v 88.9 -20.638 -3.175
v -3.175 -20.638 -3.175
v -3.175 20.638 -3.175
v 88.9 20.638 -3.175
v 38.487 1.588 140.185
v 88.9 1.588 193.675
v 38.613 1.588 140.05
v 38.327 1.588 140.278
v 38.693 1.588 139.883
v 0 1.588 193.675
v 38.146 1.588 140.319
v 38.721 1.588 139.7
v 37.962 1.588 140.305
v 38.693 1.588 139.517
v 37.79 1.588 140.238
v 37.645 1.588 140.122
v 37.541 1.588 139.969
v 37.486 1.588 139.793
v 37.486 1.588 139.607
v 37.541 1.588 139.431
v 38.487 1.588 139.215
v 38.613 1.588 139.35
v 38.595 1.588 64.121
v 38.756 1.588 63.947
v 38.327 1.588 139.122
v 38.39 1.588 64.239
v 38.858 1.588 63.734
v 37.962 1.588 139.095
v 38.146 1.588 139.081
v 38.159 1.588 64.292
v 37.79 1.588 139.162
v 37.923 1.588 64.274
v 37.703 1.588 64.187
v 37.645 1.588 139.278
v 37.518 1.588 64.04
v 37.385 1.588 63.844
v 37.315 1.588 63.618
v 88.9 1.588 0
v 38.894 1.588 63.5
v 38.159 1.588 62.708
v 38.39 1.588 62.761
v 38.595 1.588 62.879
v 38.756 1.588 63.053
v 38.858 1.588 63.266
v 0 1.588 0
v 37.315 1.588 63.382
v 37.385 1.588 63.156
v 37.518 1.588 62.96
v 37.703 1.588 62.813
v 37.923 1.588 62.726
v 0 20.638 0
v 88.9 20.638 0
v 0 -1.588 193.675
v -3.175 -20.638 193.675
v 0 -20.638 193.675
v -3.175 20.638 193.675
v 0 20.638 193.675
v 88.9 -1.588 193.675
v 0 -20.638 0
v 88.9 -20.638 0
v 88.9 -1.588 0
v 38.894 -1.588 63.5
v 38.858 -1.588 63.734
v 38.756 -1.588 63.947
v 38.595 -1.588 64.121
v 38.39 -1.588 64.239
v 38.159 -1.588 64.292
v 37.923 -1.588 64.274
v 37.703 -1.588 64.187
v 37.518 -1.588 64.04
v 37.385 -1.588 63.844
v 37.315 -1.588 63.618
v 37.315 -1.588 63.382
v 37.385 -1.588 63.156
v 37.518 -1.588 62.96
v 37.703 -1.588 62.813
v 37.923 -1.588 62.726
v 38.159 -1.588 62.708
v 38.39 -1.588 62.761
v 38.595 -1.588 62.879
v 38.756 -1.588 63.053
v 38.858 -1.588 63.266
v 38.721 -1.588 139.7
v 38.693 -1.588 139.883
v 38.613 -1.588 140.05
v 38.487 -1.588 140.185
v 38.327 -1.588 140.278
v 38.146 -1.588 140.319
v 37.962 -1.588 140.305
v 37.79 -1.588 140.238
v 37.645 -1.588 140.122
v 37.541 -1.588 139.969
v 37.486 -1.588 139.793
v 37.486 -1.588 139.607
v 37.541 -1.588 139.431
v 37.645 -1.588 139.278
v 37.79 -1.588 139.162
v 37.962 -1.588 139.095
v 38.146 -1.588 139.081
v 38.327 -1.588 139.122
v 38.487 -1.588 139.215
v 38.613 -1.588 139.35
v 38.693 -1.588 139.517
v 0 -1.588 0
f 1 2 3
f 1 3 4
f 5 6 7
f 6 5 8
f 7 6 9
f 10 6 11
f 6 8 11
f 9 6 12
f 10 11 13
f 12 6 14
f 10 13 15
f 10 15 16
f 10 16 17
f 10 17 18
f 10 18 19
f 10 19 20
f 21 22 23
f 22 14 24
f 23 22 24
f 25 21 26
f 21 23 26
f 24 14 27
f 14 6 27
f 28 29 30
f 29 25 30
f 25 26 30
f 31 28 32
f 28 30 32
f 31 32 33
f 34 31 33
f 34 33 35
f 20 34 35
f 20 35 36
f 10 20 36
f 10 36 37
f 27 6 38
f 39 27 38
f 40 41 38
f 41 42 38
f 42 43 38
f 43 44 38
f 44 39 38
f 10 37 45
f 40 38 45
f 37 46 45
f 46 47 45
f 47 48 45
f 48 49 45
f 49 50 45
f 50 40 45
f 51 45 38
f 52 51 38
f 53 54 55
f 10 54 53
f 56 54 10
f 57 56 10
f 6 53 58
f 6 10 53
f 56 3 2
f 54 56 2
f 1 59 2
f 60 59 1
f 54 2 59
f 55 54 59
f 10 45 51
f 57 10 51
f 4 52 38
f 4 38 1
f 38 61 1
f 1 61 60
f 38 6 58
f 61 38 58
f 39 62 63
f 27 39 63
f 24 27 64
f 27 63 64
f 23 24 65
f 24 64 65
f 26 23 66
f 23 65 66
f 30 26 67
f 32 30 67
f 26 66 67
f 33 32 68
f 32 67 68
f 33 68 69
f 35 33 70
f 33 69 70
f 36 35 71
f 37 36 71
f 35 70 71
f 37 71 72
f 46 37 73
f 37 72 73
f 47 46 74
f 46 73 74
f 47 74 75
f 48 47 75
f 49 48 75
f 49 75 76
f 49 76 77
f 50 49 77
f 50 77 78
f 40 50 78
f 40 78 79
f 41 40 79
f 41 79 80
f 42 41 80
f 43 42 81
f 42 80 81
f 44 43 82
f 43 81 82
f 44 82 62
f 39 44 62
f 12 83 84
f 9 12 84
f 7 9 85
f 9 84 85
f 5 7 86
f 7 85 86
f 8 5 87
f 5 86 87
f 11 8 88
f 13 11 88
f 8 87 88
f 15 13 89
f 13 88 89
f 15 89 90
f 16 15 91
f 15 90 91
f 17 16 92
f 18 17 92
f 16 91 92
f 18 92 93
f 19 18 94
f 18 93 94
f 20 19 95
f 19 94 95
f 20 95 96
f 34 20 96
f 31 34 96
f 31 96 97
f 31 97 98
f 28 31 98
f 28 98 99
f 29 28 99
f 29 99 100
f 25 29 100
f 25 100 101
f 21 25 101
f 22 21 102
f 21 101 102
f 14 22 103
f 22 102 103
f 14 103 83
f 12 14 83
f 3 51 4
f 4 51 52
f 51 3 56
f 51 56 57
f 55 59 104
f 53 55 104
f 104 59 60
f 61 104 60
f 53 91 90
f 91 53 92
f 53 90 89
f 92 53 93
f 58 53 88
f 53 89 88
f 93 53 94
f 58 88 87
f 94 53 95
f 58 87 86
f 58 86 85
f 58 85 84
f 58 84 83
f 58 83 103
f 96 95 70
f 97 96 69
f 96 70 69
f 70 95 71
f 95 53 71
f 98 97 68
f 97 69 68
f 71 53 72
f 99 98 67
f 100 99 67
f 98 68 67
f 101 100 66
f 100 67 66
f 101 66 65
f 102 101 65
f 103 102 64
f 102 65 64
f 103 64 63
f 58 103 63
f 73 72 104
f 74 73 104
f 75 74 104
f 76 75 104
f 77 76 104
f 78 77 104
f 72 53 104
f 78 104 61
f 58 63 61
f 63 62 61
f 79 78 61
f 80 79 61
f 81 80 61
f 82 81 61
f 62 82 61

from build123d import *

# Parameters (mm, degrees)
F1_DEPTH = 193.675
F2_W     = 92.075
F2_H     = 41.275
F3_DEPTH = 3.175
F4_R     = 0.79375
F4_R_2   = 0.620834
F5_DEPTH = 3.175


with BuildPart() as f1:
    # F0 (on Top) → F1 (new body)
    with BuildSketch(Plane.XY):
        Polygon((0, 1.5875), (0, 20.6375), (-3.175, 20.6375), (-3.175, -20.6375), (0, -20.6375), (0, -1.5875), (88.9, -1.5875), (88.9, 1.5875), align=None)
    extrude(amount=F1_DEPTH)

    # F2 (on face) → F3 (join)
    with BuildSketch(Plane(origin=(0, 0, 0), x_dir=(1, 0, 0), z_dir=(0, 0, -1))):
        with Locations((42.8625, 0)):
            Rectangle(F2_W, F2_H)
    extrude(amount=F3_DEPTH)

    # F4 (on face) → F5 (cut, through all)
    with BuildSketch(Plane.XZ.offset(1.5875)):
        with Locations((38.1, 63.5)):
            Circle(F4_R)
        with Locations((38.1, 139.7)):
            Circle(F4_R_2)
    extrude(amount=-F5_DEPTH, mode=Mode.SUBTRACT)


solid = f1.part
